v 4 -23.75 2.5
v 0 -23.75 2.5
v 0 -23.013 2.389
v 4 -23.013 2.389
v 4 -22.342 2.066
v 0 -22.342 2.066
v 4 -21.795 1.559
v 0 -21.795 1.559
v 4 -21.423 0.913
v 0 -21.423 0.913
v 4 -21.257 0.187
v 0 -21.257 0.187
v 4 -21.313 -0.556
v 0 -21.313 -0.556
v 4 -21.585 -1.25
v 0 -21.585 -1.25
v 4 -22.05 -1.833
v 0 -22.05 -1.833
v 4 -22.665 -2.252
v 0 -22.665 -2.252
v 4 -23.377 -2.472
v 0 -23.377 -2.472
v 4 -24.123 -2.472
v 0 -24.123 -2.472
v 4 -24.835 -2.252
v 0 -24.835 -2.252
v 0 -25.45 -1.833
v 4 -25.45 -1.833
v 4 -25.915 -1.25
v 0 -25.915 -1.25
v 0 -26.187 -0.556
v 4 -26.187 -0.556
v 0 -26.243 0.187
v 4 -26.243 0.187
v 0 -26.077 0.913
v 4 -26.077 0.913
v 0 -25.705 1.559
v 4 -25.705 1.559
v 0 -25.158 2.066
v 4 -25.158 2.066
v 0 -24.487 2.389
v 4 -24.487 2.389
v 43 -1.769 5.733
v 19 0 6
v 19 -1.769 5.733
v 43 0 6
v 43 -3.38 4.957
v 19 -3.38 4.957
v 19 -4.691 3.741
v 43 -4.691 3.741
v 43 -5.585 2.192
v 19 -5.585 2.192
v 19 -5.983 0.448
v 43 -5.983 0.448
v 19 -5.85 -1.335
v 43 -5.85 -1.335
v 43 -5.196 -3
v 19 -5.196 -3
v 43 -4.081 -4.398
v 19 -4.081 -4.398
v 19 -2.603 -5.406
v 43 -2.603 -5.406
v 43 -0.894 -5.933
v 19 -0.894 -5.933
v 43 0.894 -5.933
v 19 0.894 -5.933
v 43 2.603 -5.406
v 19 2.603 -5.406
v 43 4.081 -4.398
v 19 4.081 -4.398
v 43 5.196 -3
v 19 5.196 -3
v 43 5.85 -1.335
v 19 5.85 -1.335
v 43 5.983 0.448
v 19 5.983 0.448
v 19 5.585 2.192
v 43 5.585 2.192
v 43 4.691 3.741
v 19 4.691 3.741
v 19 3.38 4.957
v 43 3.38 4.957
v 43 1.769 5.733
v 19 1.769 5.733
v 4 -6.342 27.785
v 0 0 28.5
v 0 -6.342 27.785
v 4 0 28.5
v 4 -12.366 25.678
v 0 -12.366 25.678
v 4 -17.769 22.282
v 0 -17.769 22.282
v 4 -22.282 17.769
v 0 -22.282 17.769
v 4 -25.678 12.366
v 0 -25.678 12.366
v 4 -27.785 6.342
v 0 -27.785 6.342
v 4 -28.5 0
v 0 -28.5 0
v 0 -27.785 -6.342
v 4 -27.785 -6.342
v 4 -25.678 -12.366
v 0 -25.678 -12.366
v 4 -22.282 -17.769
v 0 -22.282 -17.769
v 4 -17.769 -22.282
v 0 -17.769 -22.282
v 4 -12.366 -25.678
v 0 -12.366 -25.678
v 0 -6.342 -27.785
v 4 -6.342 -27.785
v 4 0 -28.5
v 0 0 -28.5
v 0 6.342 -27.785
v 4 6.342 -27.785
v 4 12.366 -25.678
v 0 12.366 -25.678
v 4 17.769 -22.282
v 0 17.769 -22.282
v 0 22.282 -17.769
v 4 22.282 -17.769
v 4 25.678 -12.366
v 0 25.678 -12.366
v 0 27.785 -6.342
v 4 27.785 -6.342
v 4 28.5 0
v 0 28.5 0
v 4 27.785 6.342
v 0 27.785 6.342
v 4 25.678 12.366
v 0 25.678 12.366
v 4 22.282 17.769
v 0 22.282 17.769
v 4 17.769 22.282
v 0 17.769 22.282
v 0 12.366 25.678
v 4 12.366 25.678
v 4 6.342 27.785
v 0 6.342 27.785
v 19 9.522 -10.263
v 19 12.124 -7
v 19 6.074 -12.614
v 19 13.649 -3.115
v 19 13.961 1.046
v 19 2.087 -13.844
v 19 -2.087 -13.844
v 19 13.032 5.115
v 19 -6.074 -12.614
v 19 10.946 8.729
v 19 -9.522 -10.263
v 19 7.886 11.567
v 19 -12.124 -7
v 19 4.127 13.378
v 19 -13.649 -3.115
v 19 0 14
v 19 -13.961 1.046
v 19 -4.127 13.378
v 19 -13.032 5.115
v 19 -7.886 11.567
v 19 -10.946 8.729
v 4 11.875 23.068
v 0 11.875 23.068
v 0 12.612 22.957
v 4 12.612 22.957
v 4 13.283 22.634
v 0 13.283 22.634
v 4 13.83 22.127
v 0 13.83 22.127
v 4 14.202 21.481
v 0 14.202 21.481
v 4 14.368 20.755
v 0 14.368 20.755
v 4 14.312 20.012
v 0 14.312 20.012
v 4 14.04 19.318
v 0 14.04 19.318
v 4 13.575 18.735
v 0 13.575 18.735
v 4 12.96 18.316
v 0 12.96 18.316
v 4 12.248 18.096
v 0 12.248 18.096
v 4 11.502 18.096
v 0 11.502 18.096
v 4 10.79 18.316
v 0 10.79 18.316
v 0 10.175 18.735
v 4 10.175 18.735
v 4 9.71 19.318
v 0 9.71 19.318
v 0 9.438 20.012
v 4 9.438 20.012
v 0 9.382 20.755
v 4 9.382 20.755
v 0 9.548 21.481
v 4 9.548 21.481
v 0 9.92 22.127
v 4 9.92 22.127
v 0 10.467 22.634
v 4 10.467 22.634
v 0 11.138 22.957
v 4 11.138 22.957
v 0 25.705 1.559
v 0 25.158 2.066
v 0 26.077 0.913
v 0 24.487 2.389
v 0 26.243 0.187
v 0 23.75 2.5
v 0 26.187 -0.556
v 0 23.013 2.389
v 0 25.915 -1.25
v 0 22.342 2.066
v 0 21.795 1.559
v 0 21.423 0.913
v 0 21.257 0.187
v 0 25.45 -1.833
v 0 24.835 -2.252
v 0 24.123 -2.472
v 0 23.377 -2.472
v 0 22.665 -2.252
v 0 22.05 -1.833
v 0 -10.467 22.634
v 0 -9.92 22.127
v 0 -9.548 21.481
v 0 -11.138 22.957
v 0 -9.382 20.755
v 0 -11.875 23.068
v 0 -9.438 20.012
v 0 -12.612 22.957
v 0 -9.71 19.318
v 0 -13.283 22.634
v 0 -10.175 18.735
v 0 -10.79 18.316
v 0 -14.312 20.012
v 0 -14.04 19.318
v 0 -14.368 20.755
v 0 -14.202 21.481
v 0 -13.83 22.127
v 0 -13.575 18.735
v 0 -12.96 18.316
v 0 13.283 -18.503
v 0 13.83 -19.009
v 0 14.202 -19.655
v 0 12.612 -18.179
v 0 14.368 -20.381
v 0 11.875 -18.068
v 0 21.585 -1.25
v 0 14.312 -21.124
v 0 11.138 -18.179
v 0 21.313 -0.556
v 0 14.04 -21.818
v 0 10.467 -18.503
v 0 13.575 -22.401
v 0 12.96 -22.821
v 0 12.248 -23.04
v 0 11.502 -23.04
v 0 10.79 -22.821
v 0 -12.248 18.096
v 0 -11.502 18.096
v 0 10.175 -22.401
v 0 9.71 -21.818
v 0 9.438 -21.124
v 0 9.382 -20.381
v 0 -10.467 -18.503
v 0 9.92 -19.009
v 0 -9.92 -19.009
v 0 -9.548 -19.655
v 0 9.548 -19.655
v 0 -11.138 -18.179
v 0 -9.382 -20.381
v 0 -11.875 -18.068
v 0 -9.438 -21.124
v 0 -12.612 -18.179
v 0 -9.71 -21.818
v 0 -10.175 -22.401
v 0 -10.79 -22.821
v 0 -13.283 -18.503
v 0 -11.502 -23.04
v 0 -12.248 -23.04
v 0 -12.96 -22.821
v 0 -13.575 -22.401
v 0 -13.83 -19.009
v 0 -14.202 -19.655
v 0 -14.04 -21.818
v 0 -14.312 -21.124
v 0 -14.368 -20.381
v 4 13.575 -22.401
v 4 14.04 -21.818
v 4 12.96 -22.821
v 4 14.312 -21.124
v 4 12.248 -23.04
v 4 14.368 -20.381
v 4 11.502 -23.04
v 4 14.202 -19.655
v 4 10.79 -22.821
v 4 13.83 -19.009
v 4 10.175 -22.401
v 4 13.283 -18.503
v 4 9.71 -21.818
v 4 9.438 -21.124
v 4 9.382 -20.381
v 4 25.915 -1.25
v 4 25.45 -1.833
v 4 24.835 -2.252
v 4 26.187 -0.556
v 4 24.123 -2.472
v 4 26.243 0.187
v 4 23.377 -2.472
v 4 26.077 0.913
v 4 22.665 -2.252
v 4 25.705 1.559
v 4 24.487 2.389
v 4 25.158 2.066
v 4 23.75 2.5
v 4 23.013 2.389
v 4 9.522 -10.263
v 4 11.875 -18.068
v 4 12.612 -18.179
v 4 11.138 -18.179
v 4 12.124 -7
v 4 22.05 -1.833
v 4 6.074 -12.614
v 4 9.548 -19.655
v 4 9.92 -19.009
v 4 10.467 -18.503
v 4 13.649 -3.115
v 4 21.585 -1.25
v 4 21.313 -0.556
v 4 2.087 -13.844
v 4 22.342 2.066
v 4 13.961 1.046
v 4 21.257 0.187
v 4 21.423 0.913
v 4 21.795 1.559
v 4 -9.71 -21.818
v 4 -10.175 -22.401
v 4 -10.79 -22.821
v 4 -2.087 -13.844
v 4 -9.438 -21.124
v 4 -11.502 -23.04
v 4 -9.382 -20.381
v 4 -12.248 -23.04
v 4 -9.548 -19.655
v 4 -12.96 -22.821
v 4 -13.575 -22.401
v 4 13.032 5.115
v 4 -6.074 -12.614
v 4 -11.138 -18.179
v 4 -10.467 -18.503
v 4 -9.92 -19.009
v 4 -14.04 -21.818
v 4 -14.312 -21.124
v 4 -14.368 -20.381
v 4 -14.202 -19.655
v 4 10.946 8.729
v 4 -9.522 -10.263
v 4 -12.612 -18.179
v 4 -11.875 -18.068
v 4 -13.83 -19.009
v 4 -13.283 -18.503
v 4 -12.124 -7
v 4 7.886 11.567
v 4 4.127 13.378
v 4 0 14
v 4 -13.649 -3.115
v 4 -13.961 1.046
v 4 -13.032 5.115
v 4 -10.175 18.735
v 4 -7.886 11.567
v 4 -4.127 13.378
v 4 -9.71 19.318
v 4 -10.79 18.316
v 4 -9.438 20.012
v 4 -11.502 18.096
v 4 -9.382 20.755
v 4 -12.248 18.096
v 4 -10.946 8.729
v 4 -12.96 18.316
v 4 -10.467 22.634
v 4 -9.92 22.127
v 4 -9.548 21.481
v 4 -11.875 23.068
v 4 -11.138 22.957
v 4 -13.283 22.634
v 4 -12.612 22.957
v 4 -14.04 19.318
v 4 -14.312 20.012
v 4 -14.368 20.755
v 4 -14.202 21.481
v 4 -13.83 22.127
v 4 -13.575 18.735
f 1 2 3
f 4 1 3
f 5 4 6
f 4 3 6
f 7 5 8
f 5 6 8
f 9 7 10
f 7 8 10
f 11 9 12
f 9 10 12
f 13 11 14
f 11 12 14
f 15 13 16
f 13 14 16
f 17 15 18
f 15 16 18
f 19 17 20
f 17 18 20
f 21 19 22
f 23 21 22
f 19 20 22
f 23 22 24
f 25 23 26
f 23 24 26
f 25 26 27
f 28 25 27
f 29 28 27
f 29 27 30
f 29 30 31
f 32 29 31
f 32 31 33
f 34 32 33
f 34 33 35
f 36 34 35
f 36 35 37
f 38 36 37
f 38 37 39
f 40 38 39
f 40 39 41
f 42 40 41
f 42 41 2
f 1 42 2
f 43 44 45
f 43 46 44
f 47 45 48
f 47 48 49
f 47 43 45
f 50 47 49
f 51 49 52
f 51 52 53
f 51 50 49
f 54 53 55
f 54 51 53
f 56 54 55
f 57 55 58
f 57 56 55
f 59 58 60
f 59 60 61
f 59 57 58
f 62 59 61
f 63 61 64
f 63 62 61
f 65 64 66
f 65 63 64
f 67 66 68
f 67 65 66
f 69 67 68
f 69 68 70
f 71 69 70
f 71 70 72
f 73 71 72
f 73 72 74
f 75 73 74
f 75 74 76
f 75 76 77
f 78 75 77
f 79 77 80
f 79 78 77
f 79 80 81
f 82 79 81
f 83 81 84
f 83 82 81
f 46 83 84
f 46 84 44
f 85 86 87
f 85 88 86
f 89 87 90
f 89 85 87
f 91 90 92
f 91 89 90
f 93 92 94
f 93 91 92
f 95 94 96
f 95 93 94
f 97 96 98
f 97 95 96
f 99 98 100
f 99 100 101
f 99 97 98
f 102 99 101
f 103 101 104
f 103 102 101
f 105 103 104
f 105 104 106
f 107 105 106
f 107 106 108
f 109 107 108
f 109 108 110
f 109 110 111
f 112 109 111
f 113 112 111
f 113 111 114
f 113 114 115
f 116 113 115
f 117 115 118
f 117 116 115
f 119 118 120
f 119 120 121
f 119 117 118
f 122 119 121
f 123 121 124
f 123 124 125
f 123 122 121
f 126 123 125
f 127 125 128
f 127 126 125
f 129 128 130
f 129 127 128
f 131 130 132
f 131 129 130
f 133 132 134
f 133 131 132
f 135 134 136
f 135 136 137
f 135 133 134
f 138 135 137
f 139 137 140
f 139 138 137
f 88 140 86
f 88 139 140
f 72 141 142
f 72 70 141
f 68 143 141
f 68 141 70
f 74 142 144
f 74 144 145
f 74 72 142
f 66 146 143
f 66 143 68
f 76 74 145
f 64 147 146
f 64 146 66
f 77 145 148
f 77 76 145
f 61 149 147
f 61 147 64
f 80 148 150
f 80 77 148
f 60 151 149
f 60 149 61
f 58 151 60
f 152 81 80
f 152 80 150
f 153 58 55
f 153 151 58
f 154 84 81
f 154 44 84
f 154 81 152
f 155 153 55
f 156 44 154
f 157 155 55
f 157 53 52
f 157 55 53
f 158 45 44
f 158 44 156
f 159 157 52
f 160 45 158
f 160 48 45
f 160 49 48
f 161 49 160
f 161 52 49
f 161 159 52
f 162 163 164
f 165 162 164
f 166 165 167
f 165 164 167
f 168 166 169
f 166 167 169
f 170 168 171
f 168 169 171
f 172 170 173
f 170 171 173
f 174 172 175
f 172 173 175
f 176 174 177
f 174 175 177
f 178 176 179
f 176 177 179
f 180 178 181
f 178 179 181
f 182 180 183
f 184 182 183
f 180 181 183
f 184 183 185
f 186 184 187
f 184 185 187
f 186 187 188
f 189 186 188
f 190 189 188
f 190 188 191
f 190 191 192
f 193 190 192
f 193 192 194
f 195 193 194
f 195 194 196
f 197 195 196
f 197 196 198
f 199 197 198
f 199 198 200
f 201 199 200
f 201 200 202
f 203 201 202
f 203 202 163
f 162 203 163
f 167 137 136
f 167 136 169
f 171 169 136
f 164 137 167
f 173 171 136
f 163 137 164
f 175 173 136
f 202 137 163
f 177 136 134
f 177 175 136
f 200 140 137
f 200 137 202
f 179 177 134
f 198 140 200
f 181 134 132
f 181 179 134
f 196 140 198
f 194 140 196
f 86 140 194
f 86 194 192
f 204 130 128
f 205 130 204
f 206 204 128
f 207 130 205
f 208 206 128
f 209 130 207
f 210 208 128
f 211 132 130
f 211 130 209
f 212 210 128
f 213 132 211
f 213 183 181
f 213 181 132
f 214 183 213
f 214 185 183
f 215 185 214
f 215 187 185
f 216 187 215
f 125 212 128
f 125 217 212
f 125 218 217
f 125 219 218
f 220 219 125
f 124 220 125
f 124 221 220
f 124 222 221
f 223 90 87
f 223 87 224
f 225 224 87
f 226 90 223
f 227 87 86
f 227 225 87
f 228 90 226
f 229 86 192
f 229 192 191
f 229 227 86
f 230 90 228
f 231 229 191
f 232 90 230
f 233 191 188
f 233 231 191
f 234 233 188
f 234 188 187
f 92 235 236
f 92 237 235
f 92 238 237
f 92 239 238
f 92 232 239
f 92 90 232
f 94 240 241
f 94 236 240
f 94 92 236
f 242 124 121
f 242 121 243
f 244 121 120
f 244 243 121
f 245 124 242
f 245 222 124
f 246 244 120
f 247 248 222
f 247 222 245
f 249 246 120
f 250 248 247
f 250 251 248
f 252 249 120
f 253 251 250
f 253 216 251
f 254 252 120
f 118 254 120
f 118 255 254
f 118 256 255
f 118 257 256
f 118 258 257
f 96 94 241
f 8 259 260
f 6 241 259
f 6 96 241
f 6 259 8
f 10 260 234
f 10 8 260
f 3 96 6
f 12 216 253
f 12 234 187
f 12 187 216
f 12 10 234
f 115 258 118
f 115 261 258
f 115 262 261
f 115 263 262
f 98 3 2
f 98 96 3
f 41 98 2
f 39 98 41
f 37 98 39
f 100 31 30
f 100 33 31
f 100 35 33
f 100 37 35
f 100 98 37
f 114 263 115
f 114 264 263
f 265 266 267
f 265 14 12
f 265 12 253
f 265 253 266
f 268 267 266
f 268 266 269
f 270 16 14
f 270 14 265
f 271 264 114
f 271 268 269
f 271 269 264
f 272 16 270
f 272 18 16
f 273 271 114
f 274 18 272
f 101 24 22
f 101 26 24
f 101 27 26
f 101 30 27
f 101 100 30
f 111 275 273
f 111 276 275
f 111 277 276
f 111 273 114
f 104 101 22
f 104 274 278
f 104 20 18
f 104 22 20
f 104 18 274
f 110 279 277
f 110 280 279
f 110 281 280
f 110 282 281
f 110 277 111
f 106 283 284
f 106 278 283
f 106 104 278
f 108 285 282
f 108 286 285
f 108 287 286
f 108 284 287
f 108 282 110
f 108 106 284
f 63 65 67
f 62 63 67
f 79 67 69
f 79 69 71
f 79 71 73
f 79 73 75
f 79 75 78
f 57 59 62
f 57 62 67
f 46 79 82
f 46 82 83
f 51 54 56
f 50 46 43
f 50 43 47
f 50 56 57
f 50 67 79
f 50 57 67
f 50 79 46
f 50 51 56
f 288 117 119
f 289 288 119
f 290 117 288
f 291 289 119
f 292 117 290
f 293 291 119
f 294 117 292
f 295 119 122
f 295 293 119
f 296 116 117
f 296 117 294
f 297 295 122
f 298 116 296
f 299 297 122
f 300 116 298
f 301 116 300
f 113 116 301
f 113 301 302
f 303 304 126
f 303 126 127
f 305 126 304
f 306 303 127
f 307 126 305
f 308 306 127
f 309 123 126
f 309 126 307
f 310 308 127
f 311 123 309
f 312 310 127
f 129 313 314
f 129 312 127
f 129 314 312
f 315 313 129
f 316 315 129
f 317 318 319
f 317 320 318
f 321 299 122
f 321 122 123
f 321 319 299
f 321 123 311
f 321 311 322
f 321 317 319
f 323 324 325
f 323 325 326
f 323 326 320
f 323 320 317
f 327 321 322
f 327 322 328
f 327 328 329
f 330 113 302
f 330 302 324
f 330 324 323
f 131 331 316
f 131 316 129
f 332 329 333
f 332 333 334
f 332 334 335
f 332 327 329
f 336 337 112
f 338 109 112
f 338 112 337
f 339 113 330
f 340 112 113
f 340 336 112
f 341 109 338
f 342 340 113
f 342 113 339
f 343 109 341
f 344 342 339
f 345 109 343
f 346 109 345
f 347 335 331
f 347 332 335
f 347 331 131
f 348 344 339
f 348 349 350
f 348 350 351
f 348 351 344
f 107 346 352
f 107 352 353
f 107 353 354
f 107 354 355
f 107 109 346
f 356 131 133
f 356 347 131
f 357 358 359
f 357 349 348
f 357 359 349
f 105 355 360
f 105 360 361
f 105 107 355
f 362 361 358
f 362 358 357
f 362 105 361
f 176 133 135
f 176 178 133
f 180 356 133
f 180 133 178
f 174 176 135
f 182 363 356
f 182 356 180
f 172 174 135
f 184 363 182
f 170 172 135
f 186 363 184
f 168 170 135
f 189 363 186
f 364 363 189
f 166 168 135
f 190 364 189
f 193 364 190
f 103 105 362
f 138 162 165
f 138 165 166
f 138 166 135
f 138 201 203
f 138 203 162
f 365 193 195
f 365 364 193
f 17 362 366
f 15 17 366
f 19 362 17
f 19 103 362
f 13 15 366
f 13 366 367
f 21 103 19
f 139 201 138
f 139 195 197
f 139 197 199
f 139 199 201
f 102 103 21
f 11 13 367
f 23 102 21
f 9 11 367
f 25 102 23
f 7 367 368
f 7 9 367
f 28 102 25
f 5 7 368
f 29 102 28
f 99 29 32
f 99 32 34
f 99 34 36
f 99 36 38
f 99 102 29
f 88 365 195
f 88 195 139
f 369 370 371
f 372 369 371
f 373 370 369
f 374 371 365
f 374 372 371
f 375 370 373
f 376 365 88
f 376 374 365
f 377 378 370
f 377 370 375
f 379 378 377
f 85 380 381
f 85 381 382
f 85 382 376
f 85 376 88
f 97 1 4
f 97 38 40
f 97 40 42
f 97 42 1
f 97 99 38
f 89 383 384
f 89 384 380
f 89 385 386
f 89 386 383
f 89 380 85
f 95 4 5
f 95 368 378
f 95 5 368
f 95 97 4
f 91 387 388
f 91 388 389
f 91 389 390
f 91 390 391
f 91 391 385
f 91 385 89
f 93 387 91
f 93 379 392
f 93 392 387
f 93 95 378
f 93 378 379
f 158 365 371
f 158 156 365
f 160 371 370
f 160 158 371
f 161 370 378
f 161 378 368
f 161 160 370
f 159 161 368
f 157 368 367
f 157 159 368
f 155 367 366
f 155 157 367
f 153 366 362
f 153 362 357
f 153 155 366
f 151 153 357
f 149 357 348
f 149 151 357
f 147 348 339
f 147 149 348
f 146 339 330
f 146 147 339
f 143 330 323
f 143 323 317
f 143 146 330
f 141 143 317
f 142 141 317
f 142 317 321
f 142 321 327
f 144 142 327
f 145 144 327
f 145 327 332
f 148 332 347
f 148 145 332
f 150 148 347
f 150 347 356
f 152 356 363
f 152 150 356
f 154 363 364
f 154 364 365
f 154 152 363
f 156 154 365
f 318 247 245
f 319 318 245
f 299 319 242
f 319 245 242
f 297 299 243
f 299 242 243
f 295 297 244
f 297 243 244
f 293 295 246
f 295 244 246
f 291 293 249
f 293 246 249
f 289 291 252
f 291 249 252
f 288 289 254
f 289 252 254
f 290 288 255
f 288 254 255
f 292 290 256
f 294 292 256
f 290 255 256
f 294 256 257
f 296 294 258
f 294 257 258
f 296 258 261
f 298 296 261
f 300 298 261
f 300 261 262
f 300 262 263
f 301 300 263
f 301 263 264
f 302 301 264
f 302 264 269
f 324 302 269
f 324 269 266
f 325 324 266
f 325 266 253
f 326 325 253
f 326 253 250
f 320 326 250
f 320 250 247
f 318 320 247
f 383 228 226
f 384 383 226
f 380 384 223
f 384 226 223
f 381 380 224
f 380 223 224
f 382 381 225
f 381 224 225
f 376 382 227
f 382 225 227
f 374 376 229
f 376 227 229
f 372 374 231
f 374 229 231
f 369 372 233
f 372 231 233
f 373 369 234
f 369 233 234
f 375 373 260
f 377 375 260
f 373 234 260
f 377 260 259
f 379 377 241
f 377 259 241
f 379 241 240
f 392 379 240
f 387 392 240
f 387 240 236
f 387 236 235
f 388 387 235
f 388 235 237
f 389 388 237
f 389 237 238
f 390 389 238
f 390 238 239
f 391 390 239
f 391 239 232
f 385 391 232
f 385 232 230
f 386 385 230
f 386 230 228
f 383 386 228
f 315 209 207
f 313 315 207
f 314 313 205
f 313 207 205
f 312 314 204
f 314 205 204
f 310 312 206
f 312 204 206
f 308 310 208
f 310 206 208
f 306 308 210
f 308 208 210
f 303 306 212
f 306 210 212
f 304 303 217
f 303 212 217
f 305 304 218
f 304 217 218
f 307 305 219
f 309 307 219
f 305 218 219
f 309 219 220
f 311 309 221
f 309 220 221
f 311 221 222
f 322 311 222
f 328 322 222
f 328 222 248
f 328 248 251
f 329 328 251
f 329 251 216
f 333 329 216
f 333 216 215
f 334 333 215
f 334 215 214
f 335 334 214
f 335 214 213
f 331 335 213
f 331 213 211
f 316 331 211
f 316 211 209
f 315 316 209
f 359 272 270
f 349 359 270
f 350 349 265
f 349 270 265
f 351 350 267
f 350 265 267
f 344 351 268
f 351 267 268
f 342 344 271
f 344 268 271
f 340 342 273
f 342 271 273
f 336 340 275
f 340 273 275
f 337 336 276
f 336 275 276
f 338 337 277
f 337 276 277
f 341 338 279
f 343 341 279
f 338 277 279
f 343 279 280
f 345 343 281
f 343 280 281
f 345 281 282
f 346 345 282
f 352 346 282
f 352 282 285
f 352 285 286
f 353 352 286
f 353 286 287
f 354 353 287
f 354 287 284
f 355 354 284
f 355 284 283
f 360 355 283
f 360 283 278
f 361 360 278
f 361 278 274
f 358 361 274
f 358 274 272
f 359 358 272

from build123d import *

# Parameters (mm, degrees)
CUT_EXTRUDE1_REACH = 60.936
SKETCH2_R          = 2.5


with BuildPart() as part:
    # Sketch1 → Revolve1 (revolve)
    with BuildSketch(Plane(origin=(0, 0, 0), x_dir=(1, 0, 0), z_dir=(0, 1, 0)), mode=Mode.PRIVATE) as revolve1_sk:
        Polygon((0, 0), (0, 28.5), (4, 28.5), (4, 14), (19, 14), (19, 6), (43, 6), (43, 0), align=None)
    revolve(revolve1_sk.sketch.rotate(Axis((-51.704391892, 0, 0), (1, 0, 0)), 180), axis=Axis((-51.704391892, 0, 0), (1, 0, 0)))

    # Sketch2 → Cut-Extrude1 (cut, up to next)
    with BuildSketch(Plane.ZY, mode=Mode.PRIVATE) as cut_extrude1_sk1:
        with Locations((0, 23.75)):
            Circle(SKETCH2_R)
    cut_extrude1_tool1 = extrude(cut_extrude1_sk1.sketch, amount=-CUT_EXTRUDE1_REACH, mode=Mode.PRIVATE) & part.part
    # Sketch2 → Cut-Extrude1 (cut, up to next)
    with BuildSketch(Plane.ZY, mode=Mode.PRIVATE) as cut_extrude1_sk2:
        with Locations((20.56810334, 11.875)):
            Circle(SKETCH2_R)
    cut_extrude1_tool2 = extrude(cut_extrude1_sk2.sketch, amount=-CUT_EXTRUDE1_REACH, mode=Mode.PRIVATE) & part.part
    # Sketch2 → Cut-Extrude1 (cut, up to next)
    with BuildSketch(Plane.ZY, mode=Mode.PRIVATE) as cut_extrude1_sk3:
        with Locations((20.56810334, -11.875)):
            Circle(SKETCH2_R)
    cut_extrude1_tool3 = extrude(cut_extrude1_sk3.sketch, amount=-CUT_EXTRUDE1_REACH, mode=Mode.PRIVATE) & part.part
    # Sketch2 → Cut-Extrude1 (cut, up to next)
    with BuildSketch(Plane.ZY, mode=Mode.PRIVATE) as cut_extrude1_sk4:
        with Locations((0, -23.75)):
            Circle(SKETCH2_R)
    cut_extrude1_tool4 = extrude(cut_extrude1_sk4.sketch, amount=-CUT_EXTRUDE1_REACH, mode=Mode.PRIVATE) & part.part
    # Sketch2 → Cut-Extrude1 (cut, up to next)
    with BuildSketch(Plane.ZY, mode=Mode.PRIVATE) as cut_extrude1_sk5:
        with Locations((-20.56810334, -11.875)):
            Circle(SKETCH2_R)
    cut_extrude1_tool5 = extrude(cut_extrude1_sk5.sketch, amount=-CUT_EXTRUDE1_REACH, mode=Mode.PRIVATE) & part.part
    # Sketch2 → Cut-Extrude1 (cut, up to next)
    with BuildSketch(Plane.ZY, mode=Mode.PRIVATE) as cut_extrude1_sk6:
        with Locations((-20.56810334, 11.875)):
            Circle(SKETCH2_R)
    cut_extrude1_tool6 = extrude(cut_extrude1_sk6.sketch, amount=-CUT_EXTRUDE1_REACH, mode=Mode.PRIVATE) & part.part
    add(cut_extrude1_tool1.solids().sort_by_distance((0, 23.75, 0))[0], mode=Mode.SUBTRACT)
    add(cut_extrude1_tool2.solids().sort_by_distance((0, 11.875, 20.568103))[0], mode=Mode.SUBTRACT)
    add(cut_extrude1_tool3.solids().sort_by_distance((0, -11.875, 20.568103))[0], mode=Mode.SUBTRACT)
    add(cut_extrude1_tool4.solids().sort_by_distance((0, -23.75, 0))[0], mode=Mode.SUBTRACT)
    add(cut_extrude1_tool5.solids().sort_by_distance((0, -11.875, -20.568103))[0], mode=Mode.SUBTRACT)
    add(cut_extrude1_tool6.solids().sort_by_distance((0, 11.875, -20.568103))[0], mode=Mode.SUBTRACT)


solid = part.part
